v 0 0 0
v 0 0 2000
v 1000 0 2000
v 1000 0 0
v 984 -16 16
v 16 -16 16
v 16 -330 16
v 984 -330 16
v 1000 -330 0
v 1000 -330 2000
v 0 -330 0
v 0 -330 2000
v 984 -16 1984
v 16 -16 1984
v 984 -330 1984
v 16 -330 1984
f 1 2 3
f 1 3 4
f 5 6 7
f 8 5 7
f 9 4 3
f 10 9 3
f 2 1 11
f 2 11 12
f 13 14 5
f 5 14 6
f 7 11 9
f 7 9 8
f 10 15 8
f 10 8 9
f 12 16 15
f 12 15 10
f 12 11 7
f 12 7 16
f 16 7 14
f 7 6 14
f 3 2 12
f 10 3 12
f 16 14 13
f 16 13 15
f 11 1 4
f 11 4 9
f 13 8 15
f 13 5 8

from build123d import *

# Parameters (mm, degrees)
F0_W     = 52.0596802235
F0_H     = 50.2265766263
F1_DEPTH = 330
F2_DEPTH = 2000
F3_DEPTH = 2000
F4_DEPTH = 1000
F5_T     = -16


with BuildPart() as f1:
    # F0 (on Front) → F1 (new body)
    with BuildSketch(Plane.XZ):
        with Locations((26.0298401117, 25.1132883132)):
            Rectangle(F0_W, F0_H)
    extrude(amount=F1_DEPTH)

    # F2 (add): a face of the model
    f2_faces = [f1.faces().sort_by_distance(p)[0] for p in [
        (0, -165, 25.1132883132),
    ]]
    extrude(f2_faces, amount=-F2_DEPTH)

    # F3 (add): a face of the model
    f3_faces = [f1.faces().sort_by_distance(p)[0] for p in [
        (1000, -165, 0),
    ]]
    extrude(f3_faces, amount=-F3_DEPTH)

    # F4 (intersect): a face of the model
    f4_faces = [f1.faces().sort_by_distance(p)[0] for p in [
        (0, -165, 1000),
    ]]
    extrude(f4_faces, amount=-F4_DEPTH, mode=Mode.INTERSECT)

    # F5
    f5_openings = [f1.faces().sort_by_distance(p)[0] for p in [
        (500, -330, 1000),
    ]]
    offset(amount=F5_T, openings=f5_openings)


solid = f1.part
